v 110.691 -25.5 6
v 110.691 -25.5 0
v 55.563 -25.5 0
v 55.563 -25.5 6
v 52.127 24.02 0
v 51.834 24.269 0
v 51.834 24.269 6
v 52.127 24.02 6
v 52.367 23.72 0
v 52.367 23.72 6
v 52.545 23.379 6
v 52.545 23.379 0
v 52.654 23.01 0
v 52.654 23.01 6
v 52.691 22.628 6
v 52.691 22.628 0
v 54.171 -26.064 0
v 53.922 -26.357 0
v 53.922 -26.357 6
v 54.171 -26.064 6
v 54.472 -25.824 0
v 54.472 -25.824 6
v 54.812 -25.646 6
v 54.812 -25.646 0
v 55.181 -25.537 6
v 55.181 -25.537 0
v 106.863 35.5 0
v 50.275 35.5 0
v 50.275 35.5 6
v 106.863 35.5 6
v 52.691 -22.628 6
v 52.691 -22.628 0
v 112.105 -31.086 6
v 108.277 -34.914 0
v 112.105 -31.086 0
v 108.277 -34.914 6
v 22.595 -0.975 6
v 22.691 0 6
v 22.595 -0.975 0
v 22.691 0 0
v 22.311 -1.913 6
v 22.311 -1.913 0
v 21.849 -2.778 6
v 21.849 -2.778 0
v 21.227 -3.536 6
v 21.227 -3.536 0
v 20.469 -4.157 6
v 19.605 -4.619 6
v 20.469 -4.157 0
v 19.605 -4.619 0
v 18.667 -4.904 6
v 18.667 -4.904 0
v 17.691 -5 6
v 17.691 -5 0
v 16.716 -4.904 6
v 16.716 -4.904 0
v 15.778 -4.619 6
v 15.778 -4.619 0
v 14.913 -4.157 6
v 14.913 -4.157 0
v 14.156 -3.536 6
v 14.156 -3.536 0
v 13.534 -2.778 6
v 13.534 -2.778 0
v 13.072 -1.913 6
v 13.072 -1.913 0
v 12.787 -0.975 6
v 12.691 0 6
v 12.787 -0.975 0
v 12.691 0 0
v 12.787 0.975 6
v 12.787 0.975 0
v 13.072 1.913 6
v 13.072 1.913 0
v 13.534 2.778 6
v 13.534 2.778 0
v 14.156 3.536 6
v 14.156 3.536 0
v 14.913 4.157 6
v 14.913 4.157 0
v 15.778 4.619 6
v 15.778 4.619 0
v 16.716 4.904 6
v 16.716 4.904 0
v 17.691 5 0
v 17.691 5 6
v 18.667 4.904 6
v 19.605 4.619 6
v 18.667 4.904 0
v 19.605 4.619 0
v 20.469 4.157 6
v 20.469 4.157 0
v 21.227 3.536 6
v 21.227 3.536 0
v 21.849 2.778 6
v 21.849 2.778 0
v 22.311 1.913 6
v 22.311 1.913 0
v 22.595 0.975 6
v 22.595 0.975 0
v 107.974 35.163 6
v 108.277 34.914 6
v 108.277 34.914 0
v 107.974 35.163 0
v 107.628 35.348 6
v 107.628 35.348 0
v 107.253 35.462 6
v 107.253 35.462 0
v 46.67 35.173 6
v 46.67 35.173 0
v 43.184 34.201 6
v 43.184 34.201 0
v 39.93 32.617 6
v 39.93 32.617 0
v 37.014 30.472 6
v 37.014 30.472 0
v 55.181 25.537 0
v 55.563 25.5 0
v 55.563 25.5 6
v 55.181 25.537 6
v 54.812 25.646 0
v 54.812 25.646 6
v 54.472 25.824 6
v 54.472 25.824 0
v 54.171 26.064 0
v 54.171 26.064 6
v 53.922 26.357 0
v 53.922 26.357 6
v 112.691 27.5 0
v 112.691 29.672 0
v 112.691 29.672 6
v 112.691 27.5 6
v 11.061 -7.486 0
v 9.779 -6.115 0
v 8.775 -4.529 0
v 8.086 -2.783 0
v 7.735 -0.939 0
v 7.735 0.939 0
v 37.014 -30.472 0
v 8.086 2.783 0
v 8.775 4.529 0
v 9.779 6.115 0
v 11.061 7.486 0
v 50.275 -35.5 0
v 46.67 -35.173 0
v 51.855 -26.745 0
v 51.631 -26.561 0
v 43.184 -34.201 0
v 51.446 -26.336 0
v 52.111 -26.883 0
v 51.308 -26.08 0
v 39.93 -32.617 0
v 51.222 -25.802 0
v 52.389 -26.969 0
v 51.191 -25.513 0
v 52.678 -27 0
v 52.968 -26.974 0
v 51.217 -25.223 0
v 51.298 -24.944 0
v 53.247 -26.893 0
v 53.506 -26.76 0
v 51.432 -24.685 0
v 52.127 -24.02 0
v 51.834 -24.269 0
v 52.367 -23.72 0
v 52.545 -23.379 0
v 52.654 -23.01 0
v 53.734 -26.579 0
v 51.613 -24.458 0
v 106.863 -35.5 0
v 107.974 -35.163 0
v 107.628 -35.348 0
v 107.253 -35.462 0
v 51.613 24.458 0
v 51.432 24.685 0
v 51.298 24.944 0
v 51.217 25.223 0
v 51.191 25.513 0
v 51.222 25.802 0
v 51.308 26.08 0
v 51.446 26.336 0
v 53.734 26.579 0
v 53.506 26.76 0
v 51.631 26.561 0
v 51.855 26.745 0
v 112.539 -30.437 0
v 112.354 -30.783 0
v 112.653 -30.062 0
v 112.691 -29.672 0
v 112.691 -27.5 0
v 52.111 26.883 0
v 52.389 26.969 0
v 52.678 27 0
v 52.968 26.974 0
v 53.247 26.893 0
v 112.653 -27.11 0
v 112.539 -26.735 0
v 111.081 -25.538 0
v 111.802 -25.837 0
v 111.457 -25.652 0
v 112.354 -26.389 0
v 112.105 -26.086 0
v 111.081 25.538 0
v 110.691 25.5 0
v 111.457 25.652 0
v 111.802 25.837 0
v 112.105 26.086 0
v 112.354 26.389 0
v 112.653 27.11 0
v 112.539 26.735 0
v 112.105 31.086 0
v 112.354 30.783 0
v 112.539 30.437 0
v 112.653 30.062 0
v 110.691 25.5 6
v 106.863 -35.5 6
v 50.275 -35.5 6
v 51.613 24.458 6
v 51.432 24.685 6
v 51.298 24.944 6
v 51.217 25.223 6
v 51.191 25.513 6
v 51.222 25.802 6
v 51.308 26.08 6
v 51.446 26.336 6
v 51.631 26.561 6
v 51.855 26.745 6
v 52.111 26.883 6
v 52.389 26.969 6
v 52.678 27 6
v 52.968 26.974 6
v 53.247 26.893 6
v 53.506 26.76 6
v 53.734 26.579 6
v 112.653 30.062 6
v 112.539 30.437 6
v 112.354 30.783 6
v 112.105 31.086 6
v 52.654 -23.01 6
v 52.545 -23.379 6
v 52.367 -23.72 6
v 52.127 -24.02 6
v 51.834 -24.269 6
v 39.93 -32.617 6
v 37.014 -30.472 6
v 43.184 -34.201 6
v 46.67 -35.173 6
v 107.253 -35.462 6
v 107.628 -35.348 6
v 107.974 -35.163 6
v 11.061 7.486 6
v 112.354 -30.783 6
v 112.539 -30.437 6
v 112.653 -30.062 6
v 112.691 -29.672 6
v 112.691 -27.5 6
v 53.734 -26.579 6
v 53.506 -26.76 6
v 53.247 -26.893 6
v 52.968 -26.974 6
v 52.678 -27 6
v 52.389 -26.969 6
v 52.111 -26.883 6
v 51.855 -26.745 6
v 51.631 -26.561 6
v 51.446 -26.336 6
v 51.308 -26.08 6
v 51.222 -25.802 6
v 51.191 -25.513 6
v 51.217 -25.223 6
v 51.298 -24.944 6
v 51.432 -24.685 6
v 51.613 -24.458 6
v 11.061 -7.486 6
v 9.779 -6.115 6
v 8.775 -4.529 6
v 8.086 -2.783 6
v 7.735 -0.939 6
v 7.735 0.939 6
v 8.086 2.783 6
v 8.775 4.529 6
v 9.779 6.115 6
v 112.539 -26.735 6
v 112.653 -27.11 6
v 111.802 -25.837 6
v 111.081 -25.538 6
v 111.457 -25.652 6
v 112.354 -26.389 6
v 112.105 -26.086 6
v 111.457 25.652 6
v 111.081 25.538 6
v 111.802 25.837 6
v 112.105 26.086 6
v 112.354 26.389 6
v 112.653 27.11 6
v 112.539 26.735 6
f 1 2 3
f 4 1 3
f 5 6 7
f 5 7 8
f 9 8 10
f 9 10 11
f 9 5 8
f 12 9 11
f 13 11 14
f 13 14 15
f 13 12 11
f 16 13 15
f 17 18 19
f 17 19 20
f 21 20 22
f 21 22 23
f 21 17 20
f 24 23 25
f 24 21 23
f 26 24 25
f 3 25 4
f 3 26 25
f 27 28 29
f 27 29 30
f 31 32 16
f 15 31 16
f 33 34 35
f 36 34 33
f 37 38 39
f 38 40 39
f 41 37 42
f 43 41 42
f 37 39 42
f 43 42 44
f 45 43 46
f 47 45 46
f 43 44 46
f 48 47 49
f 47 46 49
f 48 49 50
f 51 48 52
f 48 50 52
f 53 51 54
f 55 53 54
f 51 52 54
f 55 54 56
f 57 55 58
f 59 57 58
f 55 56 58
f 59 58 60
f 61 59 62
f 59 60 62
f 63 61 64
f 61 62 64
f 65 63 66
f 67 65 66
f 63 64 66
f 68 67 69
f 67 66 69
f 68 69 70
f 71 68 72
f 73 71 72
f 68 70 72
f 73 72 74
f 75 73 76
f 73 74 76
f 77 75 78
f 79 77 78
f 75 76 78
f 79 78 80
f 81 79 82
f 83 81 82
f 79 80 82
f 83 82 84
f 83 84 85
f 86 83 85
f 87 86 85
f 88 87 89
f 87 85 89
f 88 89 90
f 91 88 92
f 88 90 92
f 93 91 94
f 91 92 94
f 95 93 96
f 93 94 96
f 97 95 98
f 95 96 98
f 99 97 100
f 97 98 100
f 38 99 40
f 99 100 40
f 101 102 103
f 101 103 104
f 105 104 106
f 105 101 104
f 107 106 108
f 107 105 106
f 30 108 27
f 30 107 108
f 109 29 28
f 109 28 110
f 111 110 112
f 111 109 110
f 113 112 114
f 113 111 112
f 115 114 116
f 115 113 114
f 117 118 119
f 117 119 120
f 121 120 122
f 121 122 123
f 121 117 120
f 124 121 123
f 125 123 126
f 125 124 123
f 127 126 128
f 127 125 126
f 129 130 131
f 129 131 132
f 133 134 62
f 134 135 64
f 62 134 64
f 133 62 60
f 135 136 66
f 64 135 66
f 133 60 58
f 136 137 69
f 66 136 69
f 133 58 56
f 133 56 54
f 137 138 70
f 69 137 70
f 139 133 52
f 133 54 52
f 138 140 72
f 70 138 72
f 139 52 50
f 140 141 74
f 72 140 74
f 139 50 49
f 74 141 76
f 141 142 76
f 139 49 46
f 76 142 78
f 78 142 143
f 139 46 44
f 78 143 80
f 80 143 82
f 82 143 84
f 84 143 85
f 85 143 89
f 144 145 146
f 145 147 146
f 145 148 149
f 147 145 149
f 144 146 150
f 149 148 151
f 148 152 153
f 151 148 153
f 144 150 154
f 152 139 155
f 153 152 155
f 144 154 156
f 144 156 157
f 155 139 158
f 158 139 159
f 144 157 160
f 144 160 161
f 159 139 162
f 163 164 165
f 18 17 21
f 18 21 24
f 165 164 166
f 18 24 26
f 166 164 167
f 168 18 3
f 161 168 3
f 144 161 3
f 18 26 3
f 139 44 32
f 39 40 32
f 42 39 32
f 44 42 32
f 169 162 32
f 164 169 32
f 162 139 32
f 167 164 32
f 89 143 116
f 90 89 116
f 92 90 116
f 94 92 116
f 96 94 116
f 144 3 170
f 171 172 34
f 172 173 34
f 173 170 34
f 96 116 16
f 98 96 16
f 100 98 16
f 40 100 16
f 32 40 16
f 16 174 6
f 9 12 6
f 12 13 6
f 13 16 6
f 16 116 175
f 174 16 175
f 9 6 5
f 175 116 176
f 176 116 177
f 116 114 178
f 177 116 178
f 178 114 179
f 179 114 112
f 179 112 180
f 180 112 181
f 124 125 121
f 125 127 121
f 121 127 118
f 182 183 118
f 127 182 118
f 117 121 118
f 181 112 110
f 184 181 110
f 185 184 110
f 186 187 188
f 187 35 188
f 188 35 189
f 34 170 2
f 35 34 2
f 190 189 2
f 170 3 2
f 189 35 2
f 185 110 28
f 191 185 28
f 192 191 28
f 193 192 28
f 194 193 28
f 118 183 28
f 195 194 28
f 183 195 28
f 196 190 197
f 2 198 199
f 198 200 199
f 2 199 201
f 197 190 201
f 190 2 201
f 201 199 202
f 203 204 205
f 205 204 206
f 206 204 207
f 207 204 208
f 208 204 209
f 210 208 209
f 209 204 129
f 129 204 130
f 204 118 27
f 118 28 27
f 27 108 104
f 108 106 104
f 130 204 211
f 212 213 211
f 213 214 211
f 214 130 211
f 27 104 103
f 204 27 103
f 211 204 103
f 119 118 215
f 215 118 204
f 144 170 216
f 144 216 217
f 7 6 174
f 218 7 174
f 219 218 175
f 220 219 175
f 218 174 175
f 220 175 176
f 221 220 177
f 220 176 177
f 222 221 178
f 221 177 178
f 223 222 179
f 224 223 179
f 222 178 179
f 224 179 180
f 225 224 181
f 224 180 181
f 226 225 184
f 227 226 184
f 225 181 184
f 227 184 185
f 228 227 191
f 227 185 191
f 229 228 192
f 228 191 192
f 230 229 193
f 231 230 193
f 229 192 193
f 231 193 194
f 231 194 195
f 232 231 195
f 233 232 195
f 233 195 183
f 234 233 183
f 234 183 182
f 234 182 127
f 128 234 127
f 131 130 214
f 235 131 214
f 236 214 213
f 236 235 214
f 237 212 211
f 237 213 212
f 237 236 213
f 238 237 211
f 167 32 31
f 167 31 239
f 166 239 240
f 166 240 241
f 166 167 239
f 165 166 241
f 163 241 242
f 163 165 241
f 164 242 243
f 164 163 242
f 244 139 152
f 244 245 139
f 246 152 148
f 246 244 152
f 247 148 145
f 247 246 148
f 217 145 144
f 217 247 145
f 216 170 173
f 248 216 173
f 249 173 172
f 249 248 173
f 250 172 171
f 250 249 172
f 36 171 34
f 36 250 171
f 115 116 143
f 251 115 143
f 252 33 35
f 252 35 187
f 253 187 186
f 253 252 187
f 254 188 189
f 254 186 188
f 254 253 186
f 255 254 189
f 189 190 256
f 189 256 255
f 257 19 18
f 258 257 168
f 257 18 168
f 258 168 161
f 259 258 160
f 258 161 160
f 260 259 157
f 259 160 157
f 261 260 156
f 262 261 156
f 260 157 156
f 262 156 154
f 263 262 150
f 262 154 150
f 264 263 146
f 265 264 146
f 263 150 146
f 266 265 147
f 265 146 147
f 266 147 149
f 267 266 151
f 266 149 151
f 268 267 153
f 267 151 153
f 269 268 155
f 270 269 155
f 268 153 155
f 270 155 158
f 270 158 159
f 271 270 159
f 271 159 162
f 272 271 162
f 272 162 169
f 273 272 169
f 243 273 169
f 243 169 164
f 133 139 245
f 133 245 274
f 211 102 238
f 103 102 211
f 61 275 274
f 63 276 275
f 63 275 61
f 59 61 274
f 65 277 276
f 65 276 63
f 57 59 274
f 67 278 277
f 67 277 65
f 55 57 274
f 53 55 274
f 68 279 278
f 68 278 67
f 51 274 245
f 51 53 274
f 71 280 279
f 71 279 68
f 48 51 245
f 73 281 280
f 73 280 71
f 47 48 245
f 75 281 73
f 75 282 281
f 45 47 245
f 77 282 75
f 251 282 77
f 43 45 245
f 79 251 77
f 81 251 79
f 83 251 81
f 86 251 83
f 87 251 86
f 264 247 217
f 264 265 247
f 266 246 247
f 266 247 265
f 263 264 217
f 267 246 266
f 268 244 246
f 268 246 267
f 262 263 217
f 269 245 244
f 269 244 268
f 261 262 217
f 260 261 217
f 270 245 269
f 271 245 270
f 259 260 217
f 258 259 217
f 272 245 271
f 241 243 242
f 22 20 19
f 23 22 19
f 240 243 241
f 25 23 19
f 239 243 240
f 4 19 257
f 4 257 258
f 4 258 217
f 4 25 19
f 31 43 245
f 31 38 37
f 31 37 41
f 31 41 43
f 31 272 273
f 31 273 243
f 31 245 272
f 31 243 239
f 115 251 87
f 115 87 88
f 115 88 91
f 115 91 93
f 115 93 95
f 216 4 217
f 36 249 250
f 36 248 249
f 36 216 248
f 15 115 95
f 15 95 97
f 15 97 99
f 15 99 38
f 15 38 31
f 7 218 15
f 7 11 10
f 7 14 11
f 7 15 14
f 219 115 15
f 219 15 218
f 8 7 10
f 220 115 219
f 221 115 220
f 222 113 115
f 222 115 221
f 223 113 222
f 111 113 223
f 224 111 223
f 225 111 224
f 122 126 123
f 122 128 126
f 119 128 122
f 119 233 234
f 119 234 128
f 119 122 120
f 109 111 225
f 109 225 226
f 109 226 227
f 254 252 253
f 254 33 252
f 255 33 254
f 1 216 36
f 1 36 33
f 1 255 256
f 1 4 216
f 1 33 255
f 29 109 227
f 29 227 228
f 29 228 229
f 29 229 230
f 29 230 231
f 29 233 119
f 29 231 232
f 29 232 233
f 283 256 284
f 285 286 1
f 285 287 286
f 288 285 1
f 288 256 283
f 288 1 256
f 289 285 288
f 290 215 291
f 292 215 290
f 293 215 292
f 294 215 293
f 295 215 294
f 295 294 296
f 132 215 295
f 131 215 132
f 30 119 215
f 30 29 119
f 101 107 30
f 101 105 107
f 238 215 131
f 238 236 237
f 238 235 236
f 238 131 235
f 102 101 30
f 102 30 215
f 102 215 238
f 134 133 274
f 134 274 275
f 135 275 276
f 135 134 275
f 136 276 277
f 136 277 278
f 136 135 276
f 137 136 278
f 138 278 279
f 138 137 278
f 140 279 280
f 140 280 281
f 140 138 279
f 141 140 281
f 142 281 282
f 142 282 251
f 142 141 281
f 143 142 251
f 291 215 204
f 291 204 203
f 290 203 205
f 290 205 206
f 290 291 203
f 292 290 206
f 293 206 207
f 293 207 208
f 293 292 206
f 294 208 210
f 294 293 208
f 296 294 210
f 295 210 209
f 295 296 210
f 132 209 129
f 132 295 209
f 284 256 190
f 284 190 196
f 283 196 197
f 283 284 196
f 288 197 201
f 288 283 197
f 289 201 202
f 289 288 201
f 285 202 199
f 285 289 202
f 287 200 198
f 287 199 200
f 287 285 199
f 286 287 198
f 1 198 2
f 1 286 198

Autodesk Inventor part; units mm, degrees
ref_plane "YZ Plane" through (0, 0, 0) normal (1, 0, 0) x (0, 1, 0)
ref_plane "XZ Plane" through (0, 0, 0) normal (0, 1, 0) x (-1, 0, 0)
ref_plane "XY Plane" through (0, 0, 0) normal (0, 0, 1) x (1, 0, 0)
sketch "Sketch1" plane through (0, 0, 0) normal (0, 0, 1) x (1, 0, 0)
  circle A0 centre (-790.1228, -10.9134) radius 9.525 projected
  ellipse E0 centre (61.5218, 18.65) end of major axis (52.5416, 18.65) minor radius 6.35 (61.5218, 25) -> (52.5416, 18.65) ccw
  line L0 (61.5218, 25) -> (114.272, 25)
  ellipse E1 centre (114.272, 18.65) end of major axis (105.2917, 18.65) minor radius 6.35 (123.2522, 18.65) -> (114.272, 25) ccw
  line L1 (123.2522, 18.65) -> (123.2522, -18.65)
  ellipse E2 centre (114.272, -18.65) end of major axis (105.2917, -18.65) minor radius 6.35 (114.272, -25) -> (123.2522, -18.65) ccw
  line L2 (114.272, -25) -> (61.5218, -25)
  ellipse E3 centre (61.5218, -18.65) end of major axis (52.5416, -18.65) minor radius 6.35 (52.5416, -18.65) -> (61.5218, -25) ccw
  line L3 (52.5416, -18.65) -> (52.5416, 18.65)
  line L4 (114.272, 21.825) -> (61.5218, 21.825)
  ellipse E4 centre (61.5218, 18.65) end of major axis (57.0317, 18.65) minor radius 3.175 (61.5218, 21.825) -> (57.0317, 18.65) ccw
  line L5 (57.0317, 18.65) -> (57.0317, -18.65)
  ellipse E5 centre (61.5218, -18.65) end of major axis (57.0317, -18.65) minor radius 3.175 (57.0317, -18.65) -> (61.5218, -21.825) ccw
  line L6 (61.5218, -21.825) -> (114.272, -21.825)
  ellipse E6 centre (114.272, -18.65) end of major axis (109.7818, -18.65) minor radius 3.175 (114.272, -21.825) -> (118.7621, -18.65) ccw
  line L7 (118.7621, -18.65) -> (118.7621, 18.65)
  ellipse E7 centre (114.272, 18.65) end of major axis (109.7818, 18.65) minor radius 3.175 (118.7621, 18.65) -> (114.272, 21.825) ccw
  circle A1 centre (17.6912, 0) radius 5 projected
  circle A2 centre (17.6912, 0) radius 10
  line L8 (15.357, 9.7238) -> (52.5416, 18.65)
  line L9 (52.5416, -18.65) -> (15.357, -9.7238)
  dimension "d4" = 20
extrude "Extrusion1" add sketch "Sketch1" along normal blind 6 contours L3 L9 A2 L8 | A2
chamfer "Chamfer1" distance 5 angle 45 1 edges at (52.5416, 0, 6)
thicken "Thicken1" operation add thickness 3 both sides no extend neighbours yes toward (-0.7071068, 0, -0.7071068) faces at (50.8749, 5.8166, 2.6667)
sketch "Sketch2" plane through (0, 0, 0) normal (0, 0, -1) x (-1, 0, 0)
  line L0 (-49.2989, -17.8716) -> (-49.2989, 17.8716) projected
  line L1 (-15.357, -9.7238) -> (-49.2989, -17.8716) projected
  arc A0 (-15.357, -9.7238) -> (-15.357, 9.7238) centre (-17.6912, 0) ccw projected
  line L2 (-49.2989, 17.8716) -> (-15.357, 9.7238) projected
  circle A1 centre (-17.6912, 0) radius 5 projected
  line L3 (-112.6912, -35.5) -> (-42.6912, -35.5)
  line L4 (-42.6912, -35.5) -> (-42.6912, 35.5)
  line L5 (-42.6912, 35.5) -> (-112.6912, 35.5)
  line L6 (-112.6912, -35.5) -> (-42.6912, 35.5) construction
  line L7 (-42.6912, -35.5) -> (-112.6912, 35.5) construction
  line L8 (-42.6912, 35.5) -> (-11.061, 7.486)
  arc A2 (-15.357, -9.7238) -> (-15.357, 9.7238) centre (-17.6912, 0) ccw projected
  line L9 (-42.6912, -35.5) -> (-11.061, -7.486)
  line L10 (-102.6912, -25.5) -> (-52.6912, -25.5)
  line L11 (-52.6912, -25.5) -> (-52.6912, 25.5)
  line L12 (-52.6912, 25.5) -> (-102.6912, 25.5)
  line L13 (-102.6912, -25.5) -> (-52.6912, 25.5) construction
  line L14 (-52.6912, -25.5) -> (-102.6912, 25.5) construction
  line L15 (-102.6912, 25.5) -> (-112.6912, 25.5)
  line L16 (-112.6912, -25.5) -> (-102.6912, -25.5)
  line L17 (-112.6912, 35.5) -> (-112.6912, 25.5)
  line L18 (-112.6912, -25.5) -> (-112.6912, -35.5)
  line L19 (-49.2989, -17.8716) -> (-49.2989, 17.8716) projected
  point P0 (0, 0)
  point P1 (-77.6912, 0)
  point P2 (-49.2989, 0)
  point P3 (-77.6912, 0)
  point P4 (-11.061, -7.486)
  point P5 (-11.061, 7.486)
  point P6 (-49.2989, 0)
  point P7 (-52.6912, 0)
  dimension "d13" = 51
  dimension "d14" = 35
  dimension "d15" = 10
  dimension "d16" = 50
  dimension "d17" = 10
  dimension "d30" = 71
extrude "Extrusion2" add sketch "Sketch2" against normal up to surface (6 mm away)
chamfer "Chamfer2" distance 5 angle 45 2 edges at (112.6912, 35.5, 3) (112.6912, -35.5, 3)
sketch "Sketch3" plane through (0, 0, 0) normal (0, 0, -1) x (-1, 0, 0)
  line L0 (-107.6912, -35.5) -> (-112.6912, -30.5) projected
  line L1 (-107.6912, -35.5) -> (-42.6912, -35.5) projected
  line L2 (-42.6912, -35.5) -> (-11.061, -7.486) projected
  arc A0 (-11.061, -7.486) -> (-11.061, 7.486) centre (-17.6912, 0) ccw projected
  line L3 (-11.061, 7.486) -> (-42.6912, 35.5) projected
  line L4 (-42.6912, 35.5) -> (-107.6912, 35.5) projected
  line L5 (-112.6912, 30.5) -> (-107.6912, 35.5) projected
  line L6 (-112.6912, 30.5) -> (-112.6912, 25.5) projected
  line L7 (-112.6912, 25.5) -> (-52.6912, 25.5) projected
  line L8 (-52.6912, 25.5) -> (-52.6912, -25.5) projected
  line L9 (-52.6912, -25.5) -> (-112.6912, -25.5) projected
  line L10 (-112.6912, -25.5) -> (-112.6912, -30.5) projected
  circle A1 centre (-17.6912, 0) radius 5 projected
  line L11 (-52.6912, 25.5) -> (-52.6912, -25.5) projected
  circle A2 centre (-52.6912, 25.5) radius 1.5
  circle A3 centre (-52.6912, -25.5) radius 1.5
  point P0 (0, 0)
  dimension "d23" = 3
  dimension "d24" = 3
extrude "Extrusion3" cut sketch "Sketch3" against normal through all contours A3 L8 L9 | L9 L8 A3 | A2 L7 L8 | L8 L7 A2
fillet "Fillet1" radius 2 4 edges at (52.6912, -24, 3) (54.1912, -25.5, 3) (54.1912, 25.5, 3) (52.6912, 24, 3)
fillet "Fillet2" radius 2 6 edges at (107.6912, -35.5, 3) (112.6912, -30.5, 3) (107.6912, 35.5, 3) (112.6912, 30.5, 3) (112.6912, 25.5, 3) (112.6912, -25.5, 3)
fillet "Fillet3" radius 20 2 edges at (42.6912, 35.5, 3) (42.6912, -35.5, 3)
properties part number "FRC003-1"
